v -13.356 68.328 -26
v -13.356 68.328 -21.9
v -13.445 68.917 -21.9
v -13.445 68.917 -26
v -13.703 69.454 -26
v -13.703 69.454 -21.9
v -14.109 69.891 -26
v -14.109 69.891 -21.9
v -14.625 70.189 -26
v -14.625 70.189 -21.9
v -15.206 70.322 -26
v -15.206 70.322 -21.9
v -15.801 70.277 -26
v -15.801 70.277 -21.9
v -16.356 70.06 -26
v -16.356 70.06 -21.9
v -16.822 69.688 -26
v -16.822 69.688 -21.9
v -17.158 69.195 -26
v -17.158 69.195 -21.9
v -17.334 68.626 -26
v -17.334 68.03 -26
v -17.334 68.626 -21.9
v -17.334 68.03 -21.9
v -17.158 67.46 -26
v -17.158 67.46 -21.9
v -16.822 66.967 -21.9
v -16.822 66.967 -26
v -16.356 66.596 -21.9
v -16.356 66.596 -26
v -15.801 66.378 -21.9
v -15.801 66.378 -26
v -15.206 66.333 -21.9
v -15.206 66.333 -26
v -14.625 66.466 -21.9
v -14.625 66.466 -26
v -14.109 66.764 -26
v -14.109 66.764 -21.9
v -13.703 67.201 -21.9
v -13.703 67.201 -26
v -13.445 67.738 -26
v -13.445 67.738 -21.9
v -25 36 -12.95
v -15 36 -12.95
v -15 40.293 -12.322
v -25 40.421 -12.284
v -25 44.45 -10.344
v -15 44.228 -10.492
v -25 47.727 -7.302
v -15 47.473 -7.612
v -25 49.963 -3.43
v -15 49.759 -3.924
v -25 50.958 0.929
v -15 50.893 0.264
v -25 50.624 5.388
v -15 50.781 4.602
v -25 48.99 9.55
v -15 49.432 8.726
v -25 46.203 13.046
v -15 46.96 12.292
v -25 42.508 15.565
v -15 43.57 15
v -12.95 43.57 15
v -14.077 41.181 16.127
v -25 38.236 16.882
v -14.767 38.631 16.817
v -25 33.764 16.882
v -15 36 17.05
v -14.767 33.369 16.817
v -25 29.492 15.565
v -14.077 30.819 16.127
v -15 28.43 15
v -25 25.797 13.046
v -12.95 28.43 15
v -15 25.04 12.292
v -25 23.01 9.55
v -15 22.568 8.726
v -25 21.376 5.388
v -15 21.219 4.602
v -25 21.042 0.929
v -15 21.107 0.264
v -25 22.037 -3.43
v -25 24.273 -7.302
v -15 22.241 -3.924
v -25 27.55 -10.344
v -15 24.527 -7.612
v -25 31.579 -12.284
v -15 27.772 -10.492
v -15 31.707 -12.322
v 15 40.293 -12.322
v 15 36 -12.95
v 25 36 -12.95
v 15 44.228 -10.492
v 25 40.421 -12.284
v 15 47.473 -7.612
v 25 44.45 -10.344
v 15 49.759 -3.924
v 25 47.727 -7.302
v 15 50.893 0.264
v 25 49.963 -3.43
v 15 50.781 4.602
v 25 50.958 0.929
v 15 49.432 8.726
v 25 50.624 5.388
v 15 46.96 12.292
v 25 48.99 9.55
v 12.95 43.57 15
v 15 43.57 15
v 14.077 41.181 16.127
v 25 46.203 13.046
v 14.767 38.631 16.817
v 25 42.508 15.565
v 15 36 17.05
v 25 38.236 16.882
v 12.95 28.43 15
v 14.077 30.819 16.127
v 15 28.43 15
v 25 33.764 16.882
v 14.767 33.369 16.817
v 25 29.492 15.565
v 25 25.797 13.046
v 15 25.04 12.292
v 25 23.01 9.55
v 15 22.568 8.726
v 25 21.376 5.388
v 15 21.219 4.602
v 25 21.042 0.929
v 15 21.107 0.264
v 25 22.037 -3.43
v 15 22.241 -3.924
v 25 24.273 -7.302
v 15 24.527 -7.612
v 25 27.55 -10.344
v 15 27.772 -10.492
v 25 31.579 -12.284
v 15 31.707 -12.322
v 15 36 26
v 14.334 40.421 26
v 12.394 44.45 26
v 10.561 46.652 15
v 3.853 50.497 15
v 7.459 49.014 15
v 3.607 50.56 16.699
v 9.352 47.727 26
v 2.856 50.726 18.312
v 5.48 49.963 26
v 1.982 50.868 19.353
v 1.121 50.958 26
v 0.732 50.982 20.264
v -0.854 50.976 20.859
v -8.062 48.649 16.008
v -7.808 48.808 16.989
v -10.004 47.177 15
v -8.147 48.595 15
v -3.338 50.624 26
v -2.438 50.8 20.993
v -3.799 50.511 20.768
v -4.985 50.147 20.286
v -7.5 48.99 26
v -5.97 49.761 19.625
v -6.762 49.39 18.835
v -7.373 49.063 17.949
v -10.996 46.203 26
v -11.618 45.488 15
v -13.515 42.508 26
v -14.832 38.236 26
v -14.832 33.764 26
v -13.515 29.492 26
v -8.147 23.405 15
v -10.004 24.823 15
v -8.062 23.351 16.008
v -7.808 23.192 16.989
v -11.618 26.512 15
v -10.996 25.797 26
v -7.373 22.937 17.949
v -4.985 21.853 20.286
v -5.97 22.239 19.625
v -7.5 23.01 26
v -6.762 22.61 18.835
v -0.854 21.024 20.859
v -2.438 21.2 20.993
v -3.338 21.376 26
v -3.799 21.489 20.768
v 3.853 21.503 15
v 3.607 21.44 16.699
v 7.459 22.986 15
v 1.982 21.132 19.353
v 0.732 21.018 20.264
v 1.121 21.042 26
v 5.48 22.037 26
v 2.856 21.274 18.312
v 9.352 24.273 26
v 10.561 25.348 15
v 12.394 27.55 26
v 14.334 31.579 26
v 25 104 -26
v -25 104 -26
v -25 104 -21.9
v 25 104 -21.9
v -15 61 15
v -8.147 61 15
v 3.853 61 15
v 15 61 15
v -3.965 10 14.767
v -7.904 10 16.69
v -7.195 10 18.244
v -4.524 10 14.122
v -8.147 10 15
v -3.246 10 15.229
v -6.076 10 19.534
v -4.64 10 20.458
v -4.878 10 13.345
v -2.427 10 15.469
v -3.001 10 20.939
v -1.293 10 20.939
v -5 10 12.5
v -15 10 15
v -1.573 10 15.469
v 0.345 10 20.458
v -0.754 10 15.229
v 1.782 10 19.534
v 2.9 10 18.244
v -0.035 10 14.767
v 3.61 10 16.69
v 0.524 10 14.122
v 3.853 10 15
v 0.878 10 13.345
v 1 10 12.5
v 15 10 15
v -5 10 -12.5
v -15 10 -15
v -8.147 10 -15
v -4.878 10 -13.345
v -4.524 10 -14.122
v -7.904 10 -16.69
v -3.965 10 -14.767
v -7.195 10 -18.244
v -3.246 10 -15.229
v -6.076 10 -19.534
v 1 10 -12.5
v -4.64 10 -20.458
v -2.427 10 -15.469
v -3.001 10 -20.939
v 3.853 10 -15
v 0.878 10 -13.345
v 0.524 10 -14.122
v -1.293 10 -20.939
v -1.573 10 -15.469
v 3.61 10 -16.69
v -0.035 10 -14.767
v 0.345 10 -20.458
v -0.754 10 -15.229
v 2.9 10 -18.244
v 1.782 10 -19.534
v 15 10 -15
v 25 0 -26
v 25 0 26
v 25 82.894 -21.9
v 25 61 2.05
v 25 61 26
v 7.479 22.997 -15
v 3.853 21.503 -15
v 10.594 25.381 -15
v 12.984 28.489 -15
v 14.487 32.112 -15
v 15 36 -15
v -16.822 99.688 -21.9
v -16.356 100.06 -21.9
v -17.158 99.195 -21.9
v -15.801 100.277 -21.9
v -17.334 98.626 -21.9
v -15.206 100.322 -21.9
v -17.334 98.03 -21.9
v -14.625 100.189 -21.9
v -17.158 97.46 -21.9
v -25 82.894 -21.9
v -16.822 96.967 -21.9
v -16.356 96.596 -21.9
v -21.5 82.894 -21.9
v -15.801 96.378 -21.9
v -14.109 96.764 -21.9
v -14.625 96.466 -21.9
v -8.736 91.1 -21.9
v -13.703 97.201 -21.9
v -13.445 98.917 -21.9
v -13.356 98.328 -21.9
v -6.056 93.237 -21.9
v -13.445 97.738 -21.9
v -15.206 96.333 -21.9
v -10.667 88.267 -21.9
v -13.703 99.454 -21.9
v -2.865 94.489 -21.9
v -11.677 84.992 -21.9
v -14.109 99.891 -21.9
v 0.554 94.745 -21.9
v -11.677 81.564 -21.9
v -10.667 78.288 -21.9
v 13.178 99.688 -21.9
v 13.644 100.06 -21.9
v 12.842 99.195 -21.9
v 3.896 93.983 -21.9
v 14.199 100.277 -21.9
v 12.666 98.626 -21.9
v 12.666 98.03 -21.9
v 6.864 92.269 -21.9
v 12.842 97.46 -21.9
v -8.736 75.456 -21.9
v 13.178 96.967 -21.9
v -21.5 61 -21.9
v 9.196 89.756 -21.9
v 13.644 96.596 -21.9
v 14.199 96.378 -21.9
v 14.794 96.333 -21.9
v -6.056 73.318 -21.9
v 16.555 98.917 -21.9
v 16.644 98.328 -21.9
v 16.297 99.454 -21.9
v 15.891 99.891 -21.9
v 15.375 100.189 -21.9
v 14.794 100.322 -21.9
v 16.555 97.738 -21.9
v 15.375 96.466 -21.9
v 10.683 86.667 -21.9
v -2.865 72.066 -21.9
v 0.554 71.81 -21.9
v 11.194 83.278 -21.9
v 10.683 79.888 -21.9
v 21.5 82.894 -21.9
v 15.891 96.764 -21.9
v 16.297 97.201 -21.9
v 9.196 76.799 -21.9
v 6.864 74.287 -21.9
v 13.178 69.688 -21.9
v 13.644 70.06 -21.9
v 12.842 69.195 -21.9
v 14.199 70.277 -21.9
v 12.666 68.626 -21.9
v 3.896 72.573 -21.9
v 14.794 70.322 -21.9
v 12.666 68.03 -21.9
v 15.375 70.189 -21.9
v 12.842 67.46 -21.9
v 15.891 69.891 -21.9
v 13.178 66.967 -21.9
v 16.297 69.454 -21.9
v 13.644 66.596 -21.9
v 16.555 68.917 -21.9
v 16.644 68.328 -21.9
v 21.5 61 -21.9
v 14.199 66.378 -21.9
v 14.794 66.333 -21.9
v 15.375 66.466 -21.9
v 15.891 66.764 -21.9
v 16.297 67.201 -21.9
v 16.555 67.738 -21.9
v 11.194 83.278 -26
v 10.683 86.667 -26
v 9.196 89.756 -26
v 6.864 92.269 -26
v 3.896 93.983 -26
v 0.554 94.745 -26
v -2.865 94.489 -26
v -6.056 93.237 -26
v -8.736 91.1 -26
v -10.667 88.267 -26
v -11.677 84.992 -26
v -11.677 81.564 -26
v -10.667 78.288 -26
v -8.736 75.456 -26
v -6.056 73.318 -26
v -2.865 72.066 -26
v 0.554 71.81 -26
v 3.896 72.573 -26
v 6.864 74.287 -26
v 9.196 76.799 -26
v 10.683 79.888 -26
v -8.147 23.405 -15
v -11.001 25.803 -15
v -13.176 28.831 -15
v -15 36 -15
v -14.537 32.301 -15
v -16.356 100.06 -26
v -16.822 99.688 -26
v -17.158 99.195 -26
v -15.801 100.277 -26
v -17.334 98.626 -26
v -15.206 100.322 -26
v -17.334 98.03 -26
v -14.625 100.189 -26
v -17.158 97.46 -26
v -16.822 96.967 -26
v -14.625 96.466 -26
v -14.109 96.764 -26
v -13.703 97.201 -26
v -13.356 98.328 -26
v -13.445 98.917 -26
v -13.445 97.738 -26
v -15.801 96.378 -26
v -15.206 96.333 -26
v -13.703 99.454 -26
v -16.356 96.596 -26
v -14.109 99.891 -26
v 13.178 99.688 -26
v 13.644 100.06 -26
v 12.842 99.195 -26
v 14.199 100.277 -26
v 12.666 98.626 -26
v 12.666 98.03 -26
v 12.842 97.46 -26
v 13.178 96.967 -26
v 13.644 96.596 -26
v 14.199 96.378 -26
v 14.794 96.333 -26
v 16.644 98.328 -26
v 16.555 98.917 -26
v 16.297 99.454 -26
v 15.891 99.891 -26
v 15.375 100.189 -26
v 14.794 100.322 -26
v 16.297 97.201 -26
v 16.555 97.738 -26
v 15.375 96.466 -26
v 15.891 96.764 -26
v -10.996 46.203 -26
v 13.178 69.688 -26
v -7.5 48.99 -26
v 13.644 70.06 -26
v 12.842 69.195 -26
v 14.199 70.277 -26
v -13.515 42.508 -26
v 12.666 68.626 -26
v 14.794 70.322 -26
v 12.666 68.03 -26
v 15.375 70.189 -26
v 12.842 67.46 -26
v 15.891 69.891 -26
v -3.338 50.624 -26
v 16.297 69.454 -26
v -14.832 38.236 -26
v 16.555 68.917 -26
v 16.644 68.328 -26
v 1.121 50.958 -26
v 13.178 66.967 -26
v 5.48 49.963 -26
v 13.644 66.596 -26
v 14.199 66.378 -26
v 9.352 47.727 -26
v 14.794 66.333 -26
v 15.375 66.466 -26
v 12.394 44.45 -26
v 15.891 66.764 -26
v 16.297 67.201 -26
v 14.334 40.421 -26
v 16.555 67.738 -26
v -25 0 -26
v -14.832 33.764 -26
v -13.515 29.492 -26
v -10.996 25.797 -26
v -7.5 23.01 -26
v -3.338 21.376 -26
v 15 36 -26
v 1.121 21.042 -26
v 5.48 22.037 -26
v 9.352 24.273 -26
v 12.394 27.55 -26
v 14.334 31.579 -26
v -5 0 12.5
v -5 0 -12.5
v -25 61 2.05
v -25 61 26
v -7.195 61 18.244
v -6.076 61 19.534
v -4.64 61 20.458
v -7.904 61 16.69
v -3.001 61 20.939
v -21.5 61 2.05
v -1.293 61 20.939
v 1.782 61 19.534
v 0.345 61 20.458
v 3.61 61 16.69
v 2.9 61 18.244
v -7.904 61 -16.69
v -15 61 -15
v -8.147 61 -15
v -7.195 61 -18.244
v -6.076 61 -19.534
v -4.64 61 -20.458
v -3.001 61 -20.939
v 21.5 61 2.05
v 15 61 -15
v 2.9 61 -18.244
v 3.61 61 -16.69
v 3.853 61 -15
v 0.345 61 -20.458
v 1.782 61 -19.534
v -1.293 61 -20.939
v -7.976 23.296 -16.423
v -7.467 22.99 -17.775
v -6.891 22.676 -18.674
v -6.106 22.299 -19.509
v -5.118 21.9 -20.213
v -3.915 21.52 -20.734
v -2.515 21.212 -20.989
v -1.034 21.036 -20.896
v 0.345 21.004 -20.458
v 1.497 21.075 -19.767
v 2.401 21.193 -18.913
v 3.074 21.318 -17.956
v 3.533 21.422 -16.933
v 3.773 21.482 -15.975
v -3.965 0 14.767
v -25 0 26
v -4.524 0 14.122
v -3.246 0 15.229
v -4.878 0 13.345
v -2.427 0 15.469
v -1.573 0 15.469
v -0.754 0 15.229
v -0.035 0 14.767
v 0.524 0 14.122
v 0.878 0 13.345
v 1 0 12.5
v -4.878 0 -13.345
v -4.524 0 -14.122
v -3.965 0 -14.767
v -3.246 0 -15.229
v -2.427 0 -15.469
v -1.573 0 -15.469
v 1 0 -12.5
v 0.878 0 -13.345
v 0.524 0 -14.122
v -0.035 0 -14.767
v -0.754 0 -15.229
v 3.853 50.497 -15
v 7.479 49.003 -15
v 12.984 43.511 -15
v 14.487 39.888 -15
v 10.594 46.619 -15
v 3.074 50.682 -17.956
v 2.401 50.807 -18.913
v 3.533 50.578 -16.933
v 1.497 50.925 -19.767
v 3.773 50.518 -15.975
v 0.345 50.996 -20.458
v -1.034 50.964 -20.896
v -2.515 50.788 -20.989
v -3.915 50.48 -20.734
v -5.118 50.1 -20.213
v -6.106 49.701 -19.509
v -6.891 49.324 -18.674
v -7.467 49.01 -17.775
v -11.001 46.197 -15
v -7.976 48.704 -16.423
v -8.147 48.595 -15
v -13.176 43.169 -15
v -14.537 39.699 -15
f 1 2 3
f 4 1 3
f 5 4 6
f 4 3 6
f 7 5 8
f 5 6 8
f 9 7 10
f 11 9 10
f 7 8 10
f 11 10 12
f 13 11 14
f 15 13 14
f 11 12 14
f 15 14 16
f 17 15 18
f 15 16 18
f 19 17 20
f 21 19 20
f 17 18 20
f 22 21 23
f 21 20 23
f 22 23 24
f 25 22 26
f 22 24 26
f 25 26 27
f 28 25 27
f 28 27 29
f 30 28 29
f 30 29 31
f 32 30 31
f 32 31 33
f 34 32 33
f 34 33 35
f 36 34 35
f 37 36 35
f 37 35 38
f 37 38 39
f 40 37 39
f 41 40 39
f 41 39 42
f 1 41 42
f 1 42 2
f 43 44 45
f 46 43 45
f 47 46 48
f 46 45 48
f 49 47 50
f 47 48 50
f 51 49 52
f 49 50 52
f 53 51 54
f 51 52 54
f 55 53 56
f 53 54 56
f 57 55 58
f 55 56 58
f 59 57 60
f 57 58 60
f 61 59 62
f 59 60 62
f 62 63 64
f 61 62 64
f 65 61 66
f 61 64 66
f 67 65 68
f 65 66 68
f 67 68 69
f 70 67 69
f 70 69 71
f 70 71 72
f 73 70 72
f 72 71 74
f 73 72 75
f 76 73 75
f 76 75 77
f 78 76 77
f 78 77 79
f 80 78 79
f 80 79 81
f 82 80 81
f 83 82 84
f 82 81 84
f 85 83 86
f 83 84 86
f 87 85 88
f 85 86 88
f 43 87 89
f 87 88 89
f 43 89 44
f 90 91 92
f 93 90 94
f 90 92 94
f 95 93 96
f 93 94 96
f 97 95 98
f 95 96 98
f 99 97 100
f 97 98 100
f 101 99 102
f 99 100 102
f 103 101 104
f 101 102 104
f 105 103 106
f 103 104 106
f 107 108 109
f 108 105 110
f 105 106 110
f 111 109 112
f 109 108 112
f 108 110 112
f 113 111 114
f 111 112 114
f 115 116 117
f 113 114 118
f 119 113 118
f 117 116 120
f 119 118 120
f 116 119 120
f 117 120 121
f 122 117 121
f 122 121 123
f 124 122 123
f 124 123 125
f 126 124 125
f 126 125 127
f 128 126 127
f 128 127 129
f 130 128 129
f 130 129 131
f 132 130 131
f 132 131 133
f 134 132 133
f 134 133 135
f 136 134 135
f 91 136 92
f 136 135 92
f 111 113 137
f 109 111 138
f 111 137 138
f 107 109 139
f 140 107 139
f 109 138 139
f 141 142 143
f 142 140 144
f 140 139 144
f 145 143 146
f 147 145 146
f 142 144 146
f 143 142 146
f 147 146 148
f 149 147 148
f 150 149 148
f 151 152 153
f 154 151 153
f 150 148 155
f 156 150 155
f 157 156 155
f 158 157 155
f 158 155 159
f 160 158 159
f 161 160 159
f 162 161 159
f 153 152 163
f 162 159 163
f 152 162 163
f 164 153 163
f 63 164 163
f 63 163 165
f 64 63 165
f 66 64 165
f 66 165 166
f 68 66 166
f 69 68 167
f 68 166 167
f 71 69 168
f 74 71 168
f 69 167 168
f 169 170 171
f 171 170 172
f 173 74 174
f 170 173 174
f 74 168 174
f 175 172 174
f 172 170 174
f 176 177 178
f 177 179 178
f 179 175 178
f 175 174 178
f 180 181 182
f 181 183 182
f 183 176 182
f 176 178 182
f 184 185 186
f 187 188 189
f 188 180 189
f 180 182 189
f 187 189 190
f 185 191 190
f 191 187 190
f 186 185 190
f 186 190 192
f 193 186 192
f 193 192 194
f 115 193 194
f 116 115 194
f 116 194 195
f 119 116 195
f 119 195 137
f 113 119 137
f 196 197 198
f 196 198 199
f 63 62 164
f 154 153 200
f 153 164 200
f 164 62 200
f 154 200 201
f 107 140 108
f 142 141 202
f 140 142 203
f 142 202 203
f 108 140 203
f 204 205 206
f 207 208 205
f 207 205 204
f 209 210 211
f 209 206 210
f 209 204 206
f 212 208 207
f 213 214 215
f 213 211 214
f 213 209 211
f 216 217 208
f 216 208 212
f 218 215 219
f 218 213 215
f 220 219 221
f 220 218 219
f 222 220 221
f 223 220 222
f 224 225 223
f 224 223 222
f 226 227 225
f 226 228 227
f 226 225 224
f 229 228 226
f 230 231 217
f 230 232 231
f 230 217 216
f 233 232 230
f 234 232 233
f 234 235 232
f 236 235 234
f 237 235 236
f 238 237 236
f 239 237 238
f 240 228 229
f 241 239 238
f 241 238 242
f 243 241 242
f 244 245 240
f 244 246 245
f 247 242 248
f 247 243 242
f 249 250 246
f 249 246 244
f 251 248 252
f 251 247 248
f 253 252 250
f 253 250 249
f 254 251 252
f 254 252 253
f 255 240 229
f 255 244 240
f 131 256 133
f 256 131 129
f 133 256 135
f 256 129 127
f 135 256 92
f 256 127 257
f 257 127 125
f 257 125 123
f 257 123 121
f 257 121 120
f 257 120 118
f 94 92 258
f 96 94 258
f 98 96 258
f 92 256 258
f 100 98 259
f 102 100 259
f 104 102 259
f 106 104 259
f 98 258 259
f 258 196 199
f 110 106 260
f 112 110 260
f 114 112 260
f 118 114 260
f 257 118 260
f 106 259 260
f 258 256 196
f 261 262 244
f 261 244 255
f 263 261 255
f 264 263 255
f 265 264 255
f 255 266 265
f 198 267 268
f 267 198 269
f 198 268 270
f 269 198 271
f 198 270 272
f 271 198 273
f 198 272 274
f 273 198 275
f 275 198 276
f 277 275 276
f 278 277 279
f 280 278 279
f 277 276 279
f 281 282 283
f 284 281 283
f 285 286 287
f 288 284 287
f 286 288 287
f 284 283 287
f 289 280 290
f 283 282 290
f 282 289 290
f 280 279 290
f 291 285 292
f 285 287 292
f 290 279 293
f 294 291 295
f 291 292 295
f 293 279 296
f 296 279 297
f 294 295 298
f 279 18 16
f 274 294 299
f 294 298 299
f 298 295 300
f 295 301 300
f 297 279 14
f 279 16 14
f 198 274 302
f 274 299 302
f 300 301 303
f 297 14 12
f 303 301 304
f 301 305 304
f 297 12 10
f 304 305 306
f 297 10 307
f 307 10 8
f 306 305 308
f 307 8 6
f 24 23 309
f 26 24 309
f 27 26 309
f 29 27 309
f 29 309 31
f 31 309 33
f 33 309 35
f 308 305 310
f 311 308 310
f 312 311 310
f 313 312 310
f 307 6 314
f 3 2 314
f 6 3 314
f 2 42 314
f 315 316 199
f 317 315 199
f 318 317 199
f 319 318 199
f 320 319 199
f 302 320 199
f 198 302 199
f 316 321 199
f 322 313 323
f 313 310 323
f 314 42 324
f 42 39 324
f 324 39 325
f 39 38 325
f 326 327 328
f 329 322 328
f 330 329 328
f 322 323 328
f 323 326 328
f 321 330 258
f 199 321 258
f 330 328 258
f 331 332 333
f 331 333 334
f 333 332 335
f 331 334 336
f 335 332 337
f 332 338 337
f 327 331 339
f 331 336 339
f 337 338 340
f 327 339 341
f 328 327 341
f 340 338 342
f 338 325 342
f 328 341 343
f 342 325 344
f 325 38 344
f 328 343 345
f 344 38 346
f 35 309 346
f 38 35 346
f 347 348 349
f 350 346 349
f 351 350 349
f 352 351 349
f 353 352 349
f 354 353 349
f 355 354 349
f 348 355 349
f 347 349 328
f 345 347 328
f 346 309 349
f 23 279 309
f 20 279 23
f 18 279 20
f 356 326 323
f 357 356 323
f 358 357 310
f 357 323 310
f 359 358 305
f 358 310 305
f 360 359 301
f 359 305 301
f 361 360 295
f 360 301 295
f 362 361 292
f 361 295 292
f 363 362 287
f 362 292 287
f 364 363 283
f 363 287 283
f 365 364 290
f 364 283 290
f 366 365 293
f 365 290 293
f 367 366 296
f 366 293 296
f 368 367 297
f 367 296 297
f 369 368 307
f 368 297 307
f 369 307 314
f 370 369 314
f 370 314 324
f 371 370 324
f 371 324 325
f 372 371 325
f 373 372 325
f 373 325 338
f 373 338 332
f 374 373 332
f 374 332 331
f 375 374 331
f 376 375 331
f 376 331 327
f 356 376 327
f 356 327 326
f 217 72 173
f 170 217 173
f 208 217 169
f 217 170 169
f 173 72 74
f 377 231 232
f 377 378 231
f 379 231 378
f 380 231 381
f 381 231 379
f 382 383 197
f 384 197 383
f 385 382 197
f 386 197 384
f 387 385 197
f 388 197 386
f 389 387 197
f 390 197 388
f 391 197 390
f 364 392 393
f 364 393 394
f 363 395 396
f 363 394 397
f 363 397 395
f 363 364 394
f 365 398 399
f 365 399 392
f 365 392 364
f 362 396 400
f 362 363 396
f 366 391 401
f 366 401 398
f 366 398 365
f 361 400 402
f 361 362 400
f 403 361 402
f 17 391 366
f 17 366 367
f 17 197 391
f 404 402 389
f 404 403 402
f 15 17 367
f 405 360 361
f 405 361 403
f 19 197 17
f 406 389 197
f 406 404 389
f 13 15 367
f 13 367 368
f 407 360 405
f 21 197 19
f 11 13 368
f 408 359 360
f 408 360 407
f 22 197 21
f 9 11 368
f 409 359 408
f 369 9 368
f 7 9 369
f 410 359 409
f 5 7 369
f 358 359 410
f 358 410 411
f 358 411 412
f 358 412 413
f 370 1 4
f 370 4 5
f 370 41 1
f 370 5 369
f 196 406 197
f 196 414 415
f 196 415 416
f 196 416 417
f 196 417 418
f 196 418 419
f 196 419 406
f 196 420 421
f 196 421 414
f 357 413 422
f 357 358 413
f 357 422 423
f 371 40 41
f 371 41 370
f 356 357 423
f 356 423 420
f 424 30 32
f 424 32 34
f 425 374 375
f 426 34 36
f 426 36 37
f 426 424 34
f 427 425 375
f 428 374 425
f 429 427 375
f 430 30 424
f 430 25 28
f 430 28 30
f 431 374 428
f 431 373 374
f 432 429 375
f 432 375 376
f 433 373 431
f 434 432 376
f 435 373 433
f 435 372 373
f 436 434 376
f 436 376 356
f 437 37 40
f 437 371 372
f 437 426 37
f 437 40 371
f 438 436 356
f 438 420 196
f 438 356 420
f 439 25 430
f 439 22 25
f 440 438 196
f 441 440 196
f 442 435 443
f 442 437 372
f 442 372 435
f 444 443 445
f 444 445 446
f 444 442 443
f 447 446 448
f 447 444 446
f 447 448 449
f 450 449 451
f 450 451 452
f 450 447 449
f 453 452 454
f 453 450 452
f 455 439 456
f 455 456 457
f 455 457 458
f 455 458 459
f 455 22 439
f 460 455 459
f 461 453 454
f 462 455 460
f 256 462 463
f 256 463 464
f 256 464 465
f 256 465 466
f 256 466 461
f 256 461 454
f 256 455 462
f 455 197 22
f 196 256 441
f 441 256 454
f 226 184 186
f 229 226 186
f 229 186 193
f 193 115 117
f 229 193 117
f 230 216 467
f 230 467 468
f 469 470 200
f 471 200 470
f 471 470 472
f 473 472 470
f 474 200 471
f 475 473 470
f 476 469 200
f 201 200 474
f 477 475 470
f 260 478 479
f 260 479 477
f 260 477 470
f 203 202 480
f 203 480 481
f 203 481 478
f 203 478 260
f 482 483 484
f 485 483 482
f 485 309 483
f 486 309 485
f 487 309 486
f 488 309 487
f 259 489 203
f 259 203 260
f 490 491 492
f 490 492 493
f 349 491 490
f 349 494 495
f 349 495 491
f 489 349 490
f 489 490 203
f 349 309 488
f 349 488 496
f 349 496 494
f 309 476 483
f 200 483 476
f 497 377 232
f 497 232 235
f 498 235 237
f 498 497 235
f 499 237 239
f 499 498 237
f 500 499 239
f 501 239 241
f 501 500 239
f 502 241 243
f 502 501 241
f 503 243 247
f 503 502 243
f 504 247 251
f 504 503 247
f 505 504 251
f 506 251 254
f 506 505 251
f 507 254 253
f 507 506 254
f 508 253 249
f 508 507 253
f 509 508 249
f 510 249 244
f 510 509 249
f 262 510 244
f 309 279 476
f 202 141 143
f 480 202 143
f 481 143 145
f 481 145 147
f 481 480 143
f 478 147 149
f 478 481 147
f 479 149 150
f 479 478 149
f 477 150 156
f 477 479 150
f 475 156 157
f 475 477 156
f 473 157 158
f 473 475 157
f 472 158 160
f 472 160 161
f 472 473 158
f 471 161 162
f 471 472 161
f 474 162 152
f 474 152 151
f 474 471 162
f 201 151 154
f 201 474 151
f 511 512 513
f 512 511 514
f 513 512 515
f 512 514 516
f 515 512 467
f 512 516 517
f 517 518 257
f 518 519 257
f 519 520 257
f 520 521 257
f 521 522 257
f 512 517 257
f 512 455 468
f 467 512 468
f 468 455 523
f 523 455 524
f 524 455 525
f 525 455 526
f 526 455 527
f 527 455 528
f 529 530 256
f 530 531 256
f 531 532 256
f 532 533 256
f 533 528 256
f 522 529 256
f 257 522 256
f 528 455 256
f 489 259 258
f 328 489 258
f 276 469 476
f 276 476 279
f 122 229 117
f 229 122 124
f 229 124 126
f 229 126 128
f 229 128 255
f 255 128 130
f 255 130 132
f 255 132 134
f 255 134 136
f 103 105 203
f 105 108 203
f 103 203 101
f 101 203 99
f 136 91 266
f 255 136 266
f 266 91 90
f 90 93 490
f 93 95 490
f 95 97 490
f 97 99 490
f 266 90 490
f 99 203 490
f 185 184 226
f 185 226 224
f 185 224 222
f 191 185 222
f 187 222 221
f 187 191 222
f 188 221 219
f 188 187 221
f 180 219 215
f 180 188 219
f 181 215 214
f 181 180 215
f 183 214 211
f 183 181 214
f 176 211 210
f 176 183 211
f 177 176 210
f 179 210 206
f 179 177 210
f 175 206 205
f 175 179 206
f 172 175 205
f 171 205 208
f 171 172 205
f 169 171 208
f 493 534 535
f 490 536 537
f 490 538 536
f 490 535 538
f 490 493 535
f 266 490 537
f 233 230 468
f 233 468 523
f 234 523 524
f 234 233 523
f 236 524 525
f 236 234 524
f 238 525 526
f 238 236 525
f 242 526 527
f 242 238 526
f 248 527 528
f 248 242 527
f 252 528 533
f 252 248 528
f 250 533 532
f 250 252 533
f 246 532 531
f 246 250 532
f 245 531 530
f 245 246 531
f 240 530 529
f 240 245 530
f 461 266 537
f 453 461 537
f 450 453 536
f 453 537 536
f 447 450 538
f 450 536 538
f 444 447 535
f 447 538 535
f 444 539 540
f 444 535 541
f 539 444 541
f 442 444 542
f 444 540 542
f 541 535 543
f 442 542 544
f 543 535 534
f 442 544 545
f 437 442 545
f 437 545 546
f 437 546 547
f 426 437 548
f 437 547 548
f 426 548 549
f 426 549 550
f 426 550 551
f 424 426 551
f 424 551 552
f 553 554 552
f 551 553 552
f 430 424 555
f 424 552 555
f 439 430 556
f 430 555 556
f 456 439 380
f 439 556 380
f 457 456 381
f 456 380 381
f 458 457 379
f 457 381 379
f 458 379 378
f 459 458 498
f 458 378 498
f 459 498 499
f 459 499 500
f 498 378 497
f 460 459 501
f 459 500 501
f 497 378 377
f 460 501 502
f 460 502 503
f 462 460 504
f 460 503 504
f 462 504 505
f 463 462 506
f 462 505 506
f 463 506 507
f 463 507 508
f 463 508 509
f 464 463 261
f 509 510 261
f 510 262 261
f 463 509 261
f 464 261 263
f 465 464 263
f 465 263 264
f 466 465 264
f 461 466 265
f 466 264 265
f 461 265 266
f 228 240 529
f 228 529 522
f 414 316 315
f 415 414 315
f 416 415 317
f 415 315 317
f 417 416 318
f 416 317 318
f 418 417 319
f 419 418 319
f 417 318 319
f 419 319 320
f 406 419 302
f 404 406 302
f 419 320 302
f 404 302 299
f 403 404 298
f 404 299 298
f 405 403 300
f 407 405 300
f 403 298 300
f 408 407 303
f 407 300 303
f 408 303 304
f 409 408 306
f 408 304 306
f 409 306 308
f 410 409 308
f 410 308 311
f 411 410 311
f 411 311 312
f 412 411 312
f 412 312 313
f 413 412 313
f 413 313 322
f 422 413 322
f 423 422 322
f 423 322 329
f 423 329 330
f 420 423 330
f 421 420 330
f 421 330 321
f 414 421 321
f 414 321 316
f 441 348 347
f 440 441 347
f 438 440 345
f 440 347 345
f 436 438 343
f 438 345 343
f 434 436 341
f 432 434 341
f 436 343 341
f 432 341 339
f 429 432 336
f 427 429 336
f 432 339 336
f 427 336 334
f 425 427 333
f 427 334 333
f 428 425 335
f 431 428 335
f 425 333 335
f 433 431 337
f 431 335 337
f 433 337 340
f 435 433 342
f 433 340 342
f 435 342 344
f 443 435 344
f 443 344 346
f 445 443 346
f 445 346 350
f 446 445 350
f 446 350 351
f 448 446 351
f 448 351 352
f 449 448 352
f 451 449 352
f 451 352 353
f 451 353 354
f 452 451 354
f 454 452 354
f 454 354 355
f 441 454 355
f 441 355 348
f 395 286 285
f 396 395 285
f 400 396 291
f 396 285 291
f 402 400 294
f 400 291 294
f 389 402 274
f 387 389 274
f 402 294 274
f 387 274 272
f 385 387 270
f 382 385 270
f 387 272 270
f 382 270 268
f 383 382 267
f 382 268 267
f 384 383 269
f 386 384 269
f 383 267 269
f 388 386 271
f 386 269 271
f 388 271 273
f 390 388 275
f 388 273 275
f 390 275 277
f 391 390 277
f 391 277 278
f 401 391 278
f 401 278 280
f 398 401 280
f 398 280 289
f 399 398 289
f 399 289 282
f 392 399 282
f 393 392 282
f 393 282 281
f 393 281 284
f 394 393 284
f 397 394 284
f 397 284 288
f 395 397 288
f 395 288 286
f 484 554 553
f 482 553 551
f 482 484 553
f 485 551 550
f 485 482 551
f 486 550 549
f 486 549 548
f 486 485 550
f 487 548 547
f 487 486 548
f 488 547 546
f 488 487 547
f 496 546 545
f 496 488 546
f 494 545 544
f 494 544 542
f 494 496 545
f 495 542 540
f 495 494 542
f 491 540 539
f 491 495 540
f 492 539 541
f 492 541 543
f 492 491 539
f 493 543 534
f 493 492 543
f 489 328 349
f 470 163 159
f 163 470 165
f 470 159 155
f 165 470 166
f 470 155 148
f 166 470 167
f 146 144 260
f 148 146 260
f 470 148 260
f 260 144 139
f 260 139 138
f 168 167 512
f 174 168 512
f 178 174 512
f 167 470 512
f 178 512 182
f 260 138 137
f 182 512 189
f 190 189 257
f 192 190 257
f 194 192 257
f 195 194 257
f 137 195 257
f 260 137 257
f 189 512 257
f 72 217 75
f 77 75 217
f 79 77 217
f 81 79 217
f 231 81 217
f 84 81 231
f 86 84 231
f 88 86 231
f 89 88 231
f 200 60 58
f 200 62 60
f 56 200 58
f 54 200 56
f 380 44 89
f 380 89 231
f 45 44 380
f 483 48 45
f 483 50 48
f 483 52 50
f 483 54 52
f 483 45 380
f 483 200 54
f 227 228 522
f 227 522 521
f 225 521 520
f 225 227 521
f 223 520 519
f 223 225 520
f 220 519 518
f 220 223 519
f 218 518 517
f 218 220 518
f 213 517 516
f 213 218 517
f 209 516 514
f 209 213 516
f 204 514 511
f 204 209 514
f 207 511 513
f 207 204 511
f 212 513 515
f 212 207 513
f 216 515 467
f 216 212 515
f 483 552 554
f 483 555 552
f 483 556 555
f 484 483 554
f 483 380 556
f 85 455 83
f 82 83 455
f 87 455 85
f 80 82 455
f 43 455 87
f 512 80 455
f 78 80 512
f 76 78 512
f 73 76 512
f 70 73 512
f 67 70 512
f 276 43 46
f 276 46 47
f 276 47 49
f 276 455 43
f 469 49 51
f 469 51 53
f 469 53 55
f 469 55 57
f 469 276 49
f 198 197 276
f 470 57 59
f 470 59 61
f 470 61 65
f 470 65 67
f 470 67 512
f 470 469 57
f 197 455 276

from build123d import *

# Parameters (mm, degrees)
SKETCH1_W           = 50
SKETCH1_H           = 52
BOSS_EXTRUDE1_DEPTH = 61
SKETCH2_W           = 30
SKETCH2_H           = 30
CUT_EXTRUDE1_DEPTH  = 51
CUT_EXTRUDE2_DEPTH  = 75
CUT_EXTRUDE3_DEPTH  = 51
SKETCH6_W           = 50
SKETCH6_H           = 4.1
BOSS_EXTRUDE2_DEPTH = 43
SKETCH8_R           = 11.5
SKETCH8_R_2         = 2
CUT_EXTRUDE4_DEPTH  = 43
BOSS_EXTRUDE3_DEPTH = 3.5
BOSS_EXTRUDE4_DEPTH = 3.5
SKETCH11_R          = 15
CUT_EXTRUDE5_DEPTH  = 98.5
SKETCH12_R          = 15
CUT_EXTRUDE6_DEPTH  = 98.5


with BuildPart() as part:
    # Sketch1 → Boss-Extrude1 (new body)
    with BuildSketch(Plane(origin=(0, 0, 0), x_dir=(1, 0, 0), z_dir=(0, 1, 0))):
        Rectangle(SKETCH1_W, SKETCH1_H)
    extrude(amount=BOSS_EXTRUDE1_DEPTH)

    # Sketch2 → Cut-Extrude1 (cut)
    with BuildSketch(Plane(origin=(0, 61, 0), x_dir=(1, 0, 0), z_dir=(0, 1, 0))):
        Rectangle(SKETCH2_W, SKETCH2_H)
    extrude(amount=-CUT_EXTRUDE1_DEPTH, mode=Mode.SUBTRACT)

    # Sketch3 → Cut-Extrude2 (cut, symmetric)
    with BuildSketch(Plane(origin=(0, 10, 0), x_dir=(1, 0, 0), z_dir=(0, 1, 0))):
        with BuildLine():
            Line((1, 12.5), (1, -12.5))
            ThreePointArc((1, -12.5), (-2, -15.5), (-5, -12.5))
            Line((-5, -12.5), (-5, 12.5))
            ThreePointArc((-5, 12.5), (-2, 15.5), (1, 12.5))
        make_face()
    extrude(amount=CUT_EXTRUDE2_DEPTH, both=True, mode=Mode.SUBTRACT)

    # Sketch5 → Cut-Extrude3 (cut)
    with BuildSketch(Plane(origin=(0, 61, 0), x_dir=(1, 0, 0), z_dir=(0, 1, 0))):
        with BuildLine():
            Line((3.852906206, 15), (3.852906206, -15))
            ThreePointArc((3.852906206, -15), (-2.147093794, -21), (-8.147093794, -15))
            Line((-8.147093794, -15), (-8.147093794, 15))
            ThreePointArc((-8.147093794, 15), (-2.147093794, 21), (3.852906206, 15))
        make_face()
    extrude(amount=-CUT_EXTRUDE3_DEPTH, mode=Mode.SUBTRACT)

    # Sketch6 → Boss-Extrude2 (add)
    with BuildSketch(Plane(origin=(0, 61, 0), x_dir=(1, 0, 0), z_dir=(0, 1, 0))):
        with Locations((0, 23.95)):
            Rectangle(SKETCH6_W, SKETCH6_H)
    extrude(amount=BOSS_EXTRUDE2_DEPTH)

    # Sketch8 → Cut-Extrude4 (cut)
    with BuildSketch(Plane.XY.offset(-21.9)):
        with Locations((-0.305876732, 83.277637399)):
            Circle(SKETCH8_R)
        with Locations((-15.355876732, 68.327637399)):
            Circle(SKETCH8_R_2)
        with Locations((-15.355876732, 98.327637399)):
            Circle(SKETCH8_R_2)
        with Locations((14.644123268, 68.327637399)):
            Circle(SKETCH8_R_2)
        with Locations((14.644123268, 98.327637399)):
            Circle(SKETCH8_R_2)
    extrude(amount=-CUT_EXTRUDE4_DEPTH, mode=Mode.SUBTRACT)

    # Sketch9 → Boss-Extrude3 (add)
    with BuildSketch(Plane.ZY.offset(25)):
        Polygon((-21.9, 61), (2.05, 61), (-21.9, 82.893920103), align=None)
    extrude(amount=-BOSS_EXTRUDE3_DEPTH)

    # Sketch10 → Boss-Extrude4 (add)
    with BuildSketch(Plane(origin=(25, 0, 0), x_dir=(0, 0, -1), z_dir=(1, 0, 0))):
        Polygon((21.9, 61), (-2.05, 61), (21.9, 82.893920103), align=None)
    extrude(amount=-BOSS_EXTRUDE4_DEPTH)

    # Sketch11 → Cut-Extrude5 (cut)
    with BuildSketch(Plane.XY.offset(26)):
        with Locations((0, 36)):
            Circle(SKETCH11_R)
    extrude(amount=-CUT_EXTRUDE5_DEPTH, mode=Mode.SUBTRACT)

    # Sketch12 → Cut-Extrude6 (cut)
    with BuildSketch(Plane(origin=(25, 0, 0), x_dir=(0, 0, -1), z_dir=(1, 0, 0))):
        with Locations((-2.05, 36)):
            Circle(SKETCH12_R)
    extrude(amount=-CUT_EXTRUDE6_DEPTH, mode=Mode.SUBTRACT)


solid = part.part
